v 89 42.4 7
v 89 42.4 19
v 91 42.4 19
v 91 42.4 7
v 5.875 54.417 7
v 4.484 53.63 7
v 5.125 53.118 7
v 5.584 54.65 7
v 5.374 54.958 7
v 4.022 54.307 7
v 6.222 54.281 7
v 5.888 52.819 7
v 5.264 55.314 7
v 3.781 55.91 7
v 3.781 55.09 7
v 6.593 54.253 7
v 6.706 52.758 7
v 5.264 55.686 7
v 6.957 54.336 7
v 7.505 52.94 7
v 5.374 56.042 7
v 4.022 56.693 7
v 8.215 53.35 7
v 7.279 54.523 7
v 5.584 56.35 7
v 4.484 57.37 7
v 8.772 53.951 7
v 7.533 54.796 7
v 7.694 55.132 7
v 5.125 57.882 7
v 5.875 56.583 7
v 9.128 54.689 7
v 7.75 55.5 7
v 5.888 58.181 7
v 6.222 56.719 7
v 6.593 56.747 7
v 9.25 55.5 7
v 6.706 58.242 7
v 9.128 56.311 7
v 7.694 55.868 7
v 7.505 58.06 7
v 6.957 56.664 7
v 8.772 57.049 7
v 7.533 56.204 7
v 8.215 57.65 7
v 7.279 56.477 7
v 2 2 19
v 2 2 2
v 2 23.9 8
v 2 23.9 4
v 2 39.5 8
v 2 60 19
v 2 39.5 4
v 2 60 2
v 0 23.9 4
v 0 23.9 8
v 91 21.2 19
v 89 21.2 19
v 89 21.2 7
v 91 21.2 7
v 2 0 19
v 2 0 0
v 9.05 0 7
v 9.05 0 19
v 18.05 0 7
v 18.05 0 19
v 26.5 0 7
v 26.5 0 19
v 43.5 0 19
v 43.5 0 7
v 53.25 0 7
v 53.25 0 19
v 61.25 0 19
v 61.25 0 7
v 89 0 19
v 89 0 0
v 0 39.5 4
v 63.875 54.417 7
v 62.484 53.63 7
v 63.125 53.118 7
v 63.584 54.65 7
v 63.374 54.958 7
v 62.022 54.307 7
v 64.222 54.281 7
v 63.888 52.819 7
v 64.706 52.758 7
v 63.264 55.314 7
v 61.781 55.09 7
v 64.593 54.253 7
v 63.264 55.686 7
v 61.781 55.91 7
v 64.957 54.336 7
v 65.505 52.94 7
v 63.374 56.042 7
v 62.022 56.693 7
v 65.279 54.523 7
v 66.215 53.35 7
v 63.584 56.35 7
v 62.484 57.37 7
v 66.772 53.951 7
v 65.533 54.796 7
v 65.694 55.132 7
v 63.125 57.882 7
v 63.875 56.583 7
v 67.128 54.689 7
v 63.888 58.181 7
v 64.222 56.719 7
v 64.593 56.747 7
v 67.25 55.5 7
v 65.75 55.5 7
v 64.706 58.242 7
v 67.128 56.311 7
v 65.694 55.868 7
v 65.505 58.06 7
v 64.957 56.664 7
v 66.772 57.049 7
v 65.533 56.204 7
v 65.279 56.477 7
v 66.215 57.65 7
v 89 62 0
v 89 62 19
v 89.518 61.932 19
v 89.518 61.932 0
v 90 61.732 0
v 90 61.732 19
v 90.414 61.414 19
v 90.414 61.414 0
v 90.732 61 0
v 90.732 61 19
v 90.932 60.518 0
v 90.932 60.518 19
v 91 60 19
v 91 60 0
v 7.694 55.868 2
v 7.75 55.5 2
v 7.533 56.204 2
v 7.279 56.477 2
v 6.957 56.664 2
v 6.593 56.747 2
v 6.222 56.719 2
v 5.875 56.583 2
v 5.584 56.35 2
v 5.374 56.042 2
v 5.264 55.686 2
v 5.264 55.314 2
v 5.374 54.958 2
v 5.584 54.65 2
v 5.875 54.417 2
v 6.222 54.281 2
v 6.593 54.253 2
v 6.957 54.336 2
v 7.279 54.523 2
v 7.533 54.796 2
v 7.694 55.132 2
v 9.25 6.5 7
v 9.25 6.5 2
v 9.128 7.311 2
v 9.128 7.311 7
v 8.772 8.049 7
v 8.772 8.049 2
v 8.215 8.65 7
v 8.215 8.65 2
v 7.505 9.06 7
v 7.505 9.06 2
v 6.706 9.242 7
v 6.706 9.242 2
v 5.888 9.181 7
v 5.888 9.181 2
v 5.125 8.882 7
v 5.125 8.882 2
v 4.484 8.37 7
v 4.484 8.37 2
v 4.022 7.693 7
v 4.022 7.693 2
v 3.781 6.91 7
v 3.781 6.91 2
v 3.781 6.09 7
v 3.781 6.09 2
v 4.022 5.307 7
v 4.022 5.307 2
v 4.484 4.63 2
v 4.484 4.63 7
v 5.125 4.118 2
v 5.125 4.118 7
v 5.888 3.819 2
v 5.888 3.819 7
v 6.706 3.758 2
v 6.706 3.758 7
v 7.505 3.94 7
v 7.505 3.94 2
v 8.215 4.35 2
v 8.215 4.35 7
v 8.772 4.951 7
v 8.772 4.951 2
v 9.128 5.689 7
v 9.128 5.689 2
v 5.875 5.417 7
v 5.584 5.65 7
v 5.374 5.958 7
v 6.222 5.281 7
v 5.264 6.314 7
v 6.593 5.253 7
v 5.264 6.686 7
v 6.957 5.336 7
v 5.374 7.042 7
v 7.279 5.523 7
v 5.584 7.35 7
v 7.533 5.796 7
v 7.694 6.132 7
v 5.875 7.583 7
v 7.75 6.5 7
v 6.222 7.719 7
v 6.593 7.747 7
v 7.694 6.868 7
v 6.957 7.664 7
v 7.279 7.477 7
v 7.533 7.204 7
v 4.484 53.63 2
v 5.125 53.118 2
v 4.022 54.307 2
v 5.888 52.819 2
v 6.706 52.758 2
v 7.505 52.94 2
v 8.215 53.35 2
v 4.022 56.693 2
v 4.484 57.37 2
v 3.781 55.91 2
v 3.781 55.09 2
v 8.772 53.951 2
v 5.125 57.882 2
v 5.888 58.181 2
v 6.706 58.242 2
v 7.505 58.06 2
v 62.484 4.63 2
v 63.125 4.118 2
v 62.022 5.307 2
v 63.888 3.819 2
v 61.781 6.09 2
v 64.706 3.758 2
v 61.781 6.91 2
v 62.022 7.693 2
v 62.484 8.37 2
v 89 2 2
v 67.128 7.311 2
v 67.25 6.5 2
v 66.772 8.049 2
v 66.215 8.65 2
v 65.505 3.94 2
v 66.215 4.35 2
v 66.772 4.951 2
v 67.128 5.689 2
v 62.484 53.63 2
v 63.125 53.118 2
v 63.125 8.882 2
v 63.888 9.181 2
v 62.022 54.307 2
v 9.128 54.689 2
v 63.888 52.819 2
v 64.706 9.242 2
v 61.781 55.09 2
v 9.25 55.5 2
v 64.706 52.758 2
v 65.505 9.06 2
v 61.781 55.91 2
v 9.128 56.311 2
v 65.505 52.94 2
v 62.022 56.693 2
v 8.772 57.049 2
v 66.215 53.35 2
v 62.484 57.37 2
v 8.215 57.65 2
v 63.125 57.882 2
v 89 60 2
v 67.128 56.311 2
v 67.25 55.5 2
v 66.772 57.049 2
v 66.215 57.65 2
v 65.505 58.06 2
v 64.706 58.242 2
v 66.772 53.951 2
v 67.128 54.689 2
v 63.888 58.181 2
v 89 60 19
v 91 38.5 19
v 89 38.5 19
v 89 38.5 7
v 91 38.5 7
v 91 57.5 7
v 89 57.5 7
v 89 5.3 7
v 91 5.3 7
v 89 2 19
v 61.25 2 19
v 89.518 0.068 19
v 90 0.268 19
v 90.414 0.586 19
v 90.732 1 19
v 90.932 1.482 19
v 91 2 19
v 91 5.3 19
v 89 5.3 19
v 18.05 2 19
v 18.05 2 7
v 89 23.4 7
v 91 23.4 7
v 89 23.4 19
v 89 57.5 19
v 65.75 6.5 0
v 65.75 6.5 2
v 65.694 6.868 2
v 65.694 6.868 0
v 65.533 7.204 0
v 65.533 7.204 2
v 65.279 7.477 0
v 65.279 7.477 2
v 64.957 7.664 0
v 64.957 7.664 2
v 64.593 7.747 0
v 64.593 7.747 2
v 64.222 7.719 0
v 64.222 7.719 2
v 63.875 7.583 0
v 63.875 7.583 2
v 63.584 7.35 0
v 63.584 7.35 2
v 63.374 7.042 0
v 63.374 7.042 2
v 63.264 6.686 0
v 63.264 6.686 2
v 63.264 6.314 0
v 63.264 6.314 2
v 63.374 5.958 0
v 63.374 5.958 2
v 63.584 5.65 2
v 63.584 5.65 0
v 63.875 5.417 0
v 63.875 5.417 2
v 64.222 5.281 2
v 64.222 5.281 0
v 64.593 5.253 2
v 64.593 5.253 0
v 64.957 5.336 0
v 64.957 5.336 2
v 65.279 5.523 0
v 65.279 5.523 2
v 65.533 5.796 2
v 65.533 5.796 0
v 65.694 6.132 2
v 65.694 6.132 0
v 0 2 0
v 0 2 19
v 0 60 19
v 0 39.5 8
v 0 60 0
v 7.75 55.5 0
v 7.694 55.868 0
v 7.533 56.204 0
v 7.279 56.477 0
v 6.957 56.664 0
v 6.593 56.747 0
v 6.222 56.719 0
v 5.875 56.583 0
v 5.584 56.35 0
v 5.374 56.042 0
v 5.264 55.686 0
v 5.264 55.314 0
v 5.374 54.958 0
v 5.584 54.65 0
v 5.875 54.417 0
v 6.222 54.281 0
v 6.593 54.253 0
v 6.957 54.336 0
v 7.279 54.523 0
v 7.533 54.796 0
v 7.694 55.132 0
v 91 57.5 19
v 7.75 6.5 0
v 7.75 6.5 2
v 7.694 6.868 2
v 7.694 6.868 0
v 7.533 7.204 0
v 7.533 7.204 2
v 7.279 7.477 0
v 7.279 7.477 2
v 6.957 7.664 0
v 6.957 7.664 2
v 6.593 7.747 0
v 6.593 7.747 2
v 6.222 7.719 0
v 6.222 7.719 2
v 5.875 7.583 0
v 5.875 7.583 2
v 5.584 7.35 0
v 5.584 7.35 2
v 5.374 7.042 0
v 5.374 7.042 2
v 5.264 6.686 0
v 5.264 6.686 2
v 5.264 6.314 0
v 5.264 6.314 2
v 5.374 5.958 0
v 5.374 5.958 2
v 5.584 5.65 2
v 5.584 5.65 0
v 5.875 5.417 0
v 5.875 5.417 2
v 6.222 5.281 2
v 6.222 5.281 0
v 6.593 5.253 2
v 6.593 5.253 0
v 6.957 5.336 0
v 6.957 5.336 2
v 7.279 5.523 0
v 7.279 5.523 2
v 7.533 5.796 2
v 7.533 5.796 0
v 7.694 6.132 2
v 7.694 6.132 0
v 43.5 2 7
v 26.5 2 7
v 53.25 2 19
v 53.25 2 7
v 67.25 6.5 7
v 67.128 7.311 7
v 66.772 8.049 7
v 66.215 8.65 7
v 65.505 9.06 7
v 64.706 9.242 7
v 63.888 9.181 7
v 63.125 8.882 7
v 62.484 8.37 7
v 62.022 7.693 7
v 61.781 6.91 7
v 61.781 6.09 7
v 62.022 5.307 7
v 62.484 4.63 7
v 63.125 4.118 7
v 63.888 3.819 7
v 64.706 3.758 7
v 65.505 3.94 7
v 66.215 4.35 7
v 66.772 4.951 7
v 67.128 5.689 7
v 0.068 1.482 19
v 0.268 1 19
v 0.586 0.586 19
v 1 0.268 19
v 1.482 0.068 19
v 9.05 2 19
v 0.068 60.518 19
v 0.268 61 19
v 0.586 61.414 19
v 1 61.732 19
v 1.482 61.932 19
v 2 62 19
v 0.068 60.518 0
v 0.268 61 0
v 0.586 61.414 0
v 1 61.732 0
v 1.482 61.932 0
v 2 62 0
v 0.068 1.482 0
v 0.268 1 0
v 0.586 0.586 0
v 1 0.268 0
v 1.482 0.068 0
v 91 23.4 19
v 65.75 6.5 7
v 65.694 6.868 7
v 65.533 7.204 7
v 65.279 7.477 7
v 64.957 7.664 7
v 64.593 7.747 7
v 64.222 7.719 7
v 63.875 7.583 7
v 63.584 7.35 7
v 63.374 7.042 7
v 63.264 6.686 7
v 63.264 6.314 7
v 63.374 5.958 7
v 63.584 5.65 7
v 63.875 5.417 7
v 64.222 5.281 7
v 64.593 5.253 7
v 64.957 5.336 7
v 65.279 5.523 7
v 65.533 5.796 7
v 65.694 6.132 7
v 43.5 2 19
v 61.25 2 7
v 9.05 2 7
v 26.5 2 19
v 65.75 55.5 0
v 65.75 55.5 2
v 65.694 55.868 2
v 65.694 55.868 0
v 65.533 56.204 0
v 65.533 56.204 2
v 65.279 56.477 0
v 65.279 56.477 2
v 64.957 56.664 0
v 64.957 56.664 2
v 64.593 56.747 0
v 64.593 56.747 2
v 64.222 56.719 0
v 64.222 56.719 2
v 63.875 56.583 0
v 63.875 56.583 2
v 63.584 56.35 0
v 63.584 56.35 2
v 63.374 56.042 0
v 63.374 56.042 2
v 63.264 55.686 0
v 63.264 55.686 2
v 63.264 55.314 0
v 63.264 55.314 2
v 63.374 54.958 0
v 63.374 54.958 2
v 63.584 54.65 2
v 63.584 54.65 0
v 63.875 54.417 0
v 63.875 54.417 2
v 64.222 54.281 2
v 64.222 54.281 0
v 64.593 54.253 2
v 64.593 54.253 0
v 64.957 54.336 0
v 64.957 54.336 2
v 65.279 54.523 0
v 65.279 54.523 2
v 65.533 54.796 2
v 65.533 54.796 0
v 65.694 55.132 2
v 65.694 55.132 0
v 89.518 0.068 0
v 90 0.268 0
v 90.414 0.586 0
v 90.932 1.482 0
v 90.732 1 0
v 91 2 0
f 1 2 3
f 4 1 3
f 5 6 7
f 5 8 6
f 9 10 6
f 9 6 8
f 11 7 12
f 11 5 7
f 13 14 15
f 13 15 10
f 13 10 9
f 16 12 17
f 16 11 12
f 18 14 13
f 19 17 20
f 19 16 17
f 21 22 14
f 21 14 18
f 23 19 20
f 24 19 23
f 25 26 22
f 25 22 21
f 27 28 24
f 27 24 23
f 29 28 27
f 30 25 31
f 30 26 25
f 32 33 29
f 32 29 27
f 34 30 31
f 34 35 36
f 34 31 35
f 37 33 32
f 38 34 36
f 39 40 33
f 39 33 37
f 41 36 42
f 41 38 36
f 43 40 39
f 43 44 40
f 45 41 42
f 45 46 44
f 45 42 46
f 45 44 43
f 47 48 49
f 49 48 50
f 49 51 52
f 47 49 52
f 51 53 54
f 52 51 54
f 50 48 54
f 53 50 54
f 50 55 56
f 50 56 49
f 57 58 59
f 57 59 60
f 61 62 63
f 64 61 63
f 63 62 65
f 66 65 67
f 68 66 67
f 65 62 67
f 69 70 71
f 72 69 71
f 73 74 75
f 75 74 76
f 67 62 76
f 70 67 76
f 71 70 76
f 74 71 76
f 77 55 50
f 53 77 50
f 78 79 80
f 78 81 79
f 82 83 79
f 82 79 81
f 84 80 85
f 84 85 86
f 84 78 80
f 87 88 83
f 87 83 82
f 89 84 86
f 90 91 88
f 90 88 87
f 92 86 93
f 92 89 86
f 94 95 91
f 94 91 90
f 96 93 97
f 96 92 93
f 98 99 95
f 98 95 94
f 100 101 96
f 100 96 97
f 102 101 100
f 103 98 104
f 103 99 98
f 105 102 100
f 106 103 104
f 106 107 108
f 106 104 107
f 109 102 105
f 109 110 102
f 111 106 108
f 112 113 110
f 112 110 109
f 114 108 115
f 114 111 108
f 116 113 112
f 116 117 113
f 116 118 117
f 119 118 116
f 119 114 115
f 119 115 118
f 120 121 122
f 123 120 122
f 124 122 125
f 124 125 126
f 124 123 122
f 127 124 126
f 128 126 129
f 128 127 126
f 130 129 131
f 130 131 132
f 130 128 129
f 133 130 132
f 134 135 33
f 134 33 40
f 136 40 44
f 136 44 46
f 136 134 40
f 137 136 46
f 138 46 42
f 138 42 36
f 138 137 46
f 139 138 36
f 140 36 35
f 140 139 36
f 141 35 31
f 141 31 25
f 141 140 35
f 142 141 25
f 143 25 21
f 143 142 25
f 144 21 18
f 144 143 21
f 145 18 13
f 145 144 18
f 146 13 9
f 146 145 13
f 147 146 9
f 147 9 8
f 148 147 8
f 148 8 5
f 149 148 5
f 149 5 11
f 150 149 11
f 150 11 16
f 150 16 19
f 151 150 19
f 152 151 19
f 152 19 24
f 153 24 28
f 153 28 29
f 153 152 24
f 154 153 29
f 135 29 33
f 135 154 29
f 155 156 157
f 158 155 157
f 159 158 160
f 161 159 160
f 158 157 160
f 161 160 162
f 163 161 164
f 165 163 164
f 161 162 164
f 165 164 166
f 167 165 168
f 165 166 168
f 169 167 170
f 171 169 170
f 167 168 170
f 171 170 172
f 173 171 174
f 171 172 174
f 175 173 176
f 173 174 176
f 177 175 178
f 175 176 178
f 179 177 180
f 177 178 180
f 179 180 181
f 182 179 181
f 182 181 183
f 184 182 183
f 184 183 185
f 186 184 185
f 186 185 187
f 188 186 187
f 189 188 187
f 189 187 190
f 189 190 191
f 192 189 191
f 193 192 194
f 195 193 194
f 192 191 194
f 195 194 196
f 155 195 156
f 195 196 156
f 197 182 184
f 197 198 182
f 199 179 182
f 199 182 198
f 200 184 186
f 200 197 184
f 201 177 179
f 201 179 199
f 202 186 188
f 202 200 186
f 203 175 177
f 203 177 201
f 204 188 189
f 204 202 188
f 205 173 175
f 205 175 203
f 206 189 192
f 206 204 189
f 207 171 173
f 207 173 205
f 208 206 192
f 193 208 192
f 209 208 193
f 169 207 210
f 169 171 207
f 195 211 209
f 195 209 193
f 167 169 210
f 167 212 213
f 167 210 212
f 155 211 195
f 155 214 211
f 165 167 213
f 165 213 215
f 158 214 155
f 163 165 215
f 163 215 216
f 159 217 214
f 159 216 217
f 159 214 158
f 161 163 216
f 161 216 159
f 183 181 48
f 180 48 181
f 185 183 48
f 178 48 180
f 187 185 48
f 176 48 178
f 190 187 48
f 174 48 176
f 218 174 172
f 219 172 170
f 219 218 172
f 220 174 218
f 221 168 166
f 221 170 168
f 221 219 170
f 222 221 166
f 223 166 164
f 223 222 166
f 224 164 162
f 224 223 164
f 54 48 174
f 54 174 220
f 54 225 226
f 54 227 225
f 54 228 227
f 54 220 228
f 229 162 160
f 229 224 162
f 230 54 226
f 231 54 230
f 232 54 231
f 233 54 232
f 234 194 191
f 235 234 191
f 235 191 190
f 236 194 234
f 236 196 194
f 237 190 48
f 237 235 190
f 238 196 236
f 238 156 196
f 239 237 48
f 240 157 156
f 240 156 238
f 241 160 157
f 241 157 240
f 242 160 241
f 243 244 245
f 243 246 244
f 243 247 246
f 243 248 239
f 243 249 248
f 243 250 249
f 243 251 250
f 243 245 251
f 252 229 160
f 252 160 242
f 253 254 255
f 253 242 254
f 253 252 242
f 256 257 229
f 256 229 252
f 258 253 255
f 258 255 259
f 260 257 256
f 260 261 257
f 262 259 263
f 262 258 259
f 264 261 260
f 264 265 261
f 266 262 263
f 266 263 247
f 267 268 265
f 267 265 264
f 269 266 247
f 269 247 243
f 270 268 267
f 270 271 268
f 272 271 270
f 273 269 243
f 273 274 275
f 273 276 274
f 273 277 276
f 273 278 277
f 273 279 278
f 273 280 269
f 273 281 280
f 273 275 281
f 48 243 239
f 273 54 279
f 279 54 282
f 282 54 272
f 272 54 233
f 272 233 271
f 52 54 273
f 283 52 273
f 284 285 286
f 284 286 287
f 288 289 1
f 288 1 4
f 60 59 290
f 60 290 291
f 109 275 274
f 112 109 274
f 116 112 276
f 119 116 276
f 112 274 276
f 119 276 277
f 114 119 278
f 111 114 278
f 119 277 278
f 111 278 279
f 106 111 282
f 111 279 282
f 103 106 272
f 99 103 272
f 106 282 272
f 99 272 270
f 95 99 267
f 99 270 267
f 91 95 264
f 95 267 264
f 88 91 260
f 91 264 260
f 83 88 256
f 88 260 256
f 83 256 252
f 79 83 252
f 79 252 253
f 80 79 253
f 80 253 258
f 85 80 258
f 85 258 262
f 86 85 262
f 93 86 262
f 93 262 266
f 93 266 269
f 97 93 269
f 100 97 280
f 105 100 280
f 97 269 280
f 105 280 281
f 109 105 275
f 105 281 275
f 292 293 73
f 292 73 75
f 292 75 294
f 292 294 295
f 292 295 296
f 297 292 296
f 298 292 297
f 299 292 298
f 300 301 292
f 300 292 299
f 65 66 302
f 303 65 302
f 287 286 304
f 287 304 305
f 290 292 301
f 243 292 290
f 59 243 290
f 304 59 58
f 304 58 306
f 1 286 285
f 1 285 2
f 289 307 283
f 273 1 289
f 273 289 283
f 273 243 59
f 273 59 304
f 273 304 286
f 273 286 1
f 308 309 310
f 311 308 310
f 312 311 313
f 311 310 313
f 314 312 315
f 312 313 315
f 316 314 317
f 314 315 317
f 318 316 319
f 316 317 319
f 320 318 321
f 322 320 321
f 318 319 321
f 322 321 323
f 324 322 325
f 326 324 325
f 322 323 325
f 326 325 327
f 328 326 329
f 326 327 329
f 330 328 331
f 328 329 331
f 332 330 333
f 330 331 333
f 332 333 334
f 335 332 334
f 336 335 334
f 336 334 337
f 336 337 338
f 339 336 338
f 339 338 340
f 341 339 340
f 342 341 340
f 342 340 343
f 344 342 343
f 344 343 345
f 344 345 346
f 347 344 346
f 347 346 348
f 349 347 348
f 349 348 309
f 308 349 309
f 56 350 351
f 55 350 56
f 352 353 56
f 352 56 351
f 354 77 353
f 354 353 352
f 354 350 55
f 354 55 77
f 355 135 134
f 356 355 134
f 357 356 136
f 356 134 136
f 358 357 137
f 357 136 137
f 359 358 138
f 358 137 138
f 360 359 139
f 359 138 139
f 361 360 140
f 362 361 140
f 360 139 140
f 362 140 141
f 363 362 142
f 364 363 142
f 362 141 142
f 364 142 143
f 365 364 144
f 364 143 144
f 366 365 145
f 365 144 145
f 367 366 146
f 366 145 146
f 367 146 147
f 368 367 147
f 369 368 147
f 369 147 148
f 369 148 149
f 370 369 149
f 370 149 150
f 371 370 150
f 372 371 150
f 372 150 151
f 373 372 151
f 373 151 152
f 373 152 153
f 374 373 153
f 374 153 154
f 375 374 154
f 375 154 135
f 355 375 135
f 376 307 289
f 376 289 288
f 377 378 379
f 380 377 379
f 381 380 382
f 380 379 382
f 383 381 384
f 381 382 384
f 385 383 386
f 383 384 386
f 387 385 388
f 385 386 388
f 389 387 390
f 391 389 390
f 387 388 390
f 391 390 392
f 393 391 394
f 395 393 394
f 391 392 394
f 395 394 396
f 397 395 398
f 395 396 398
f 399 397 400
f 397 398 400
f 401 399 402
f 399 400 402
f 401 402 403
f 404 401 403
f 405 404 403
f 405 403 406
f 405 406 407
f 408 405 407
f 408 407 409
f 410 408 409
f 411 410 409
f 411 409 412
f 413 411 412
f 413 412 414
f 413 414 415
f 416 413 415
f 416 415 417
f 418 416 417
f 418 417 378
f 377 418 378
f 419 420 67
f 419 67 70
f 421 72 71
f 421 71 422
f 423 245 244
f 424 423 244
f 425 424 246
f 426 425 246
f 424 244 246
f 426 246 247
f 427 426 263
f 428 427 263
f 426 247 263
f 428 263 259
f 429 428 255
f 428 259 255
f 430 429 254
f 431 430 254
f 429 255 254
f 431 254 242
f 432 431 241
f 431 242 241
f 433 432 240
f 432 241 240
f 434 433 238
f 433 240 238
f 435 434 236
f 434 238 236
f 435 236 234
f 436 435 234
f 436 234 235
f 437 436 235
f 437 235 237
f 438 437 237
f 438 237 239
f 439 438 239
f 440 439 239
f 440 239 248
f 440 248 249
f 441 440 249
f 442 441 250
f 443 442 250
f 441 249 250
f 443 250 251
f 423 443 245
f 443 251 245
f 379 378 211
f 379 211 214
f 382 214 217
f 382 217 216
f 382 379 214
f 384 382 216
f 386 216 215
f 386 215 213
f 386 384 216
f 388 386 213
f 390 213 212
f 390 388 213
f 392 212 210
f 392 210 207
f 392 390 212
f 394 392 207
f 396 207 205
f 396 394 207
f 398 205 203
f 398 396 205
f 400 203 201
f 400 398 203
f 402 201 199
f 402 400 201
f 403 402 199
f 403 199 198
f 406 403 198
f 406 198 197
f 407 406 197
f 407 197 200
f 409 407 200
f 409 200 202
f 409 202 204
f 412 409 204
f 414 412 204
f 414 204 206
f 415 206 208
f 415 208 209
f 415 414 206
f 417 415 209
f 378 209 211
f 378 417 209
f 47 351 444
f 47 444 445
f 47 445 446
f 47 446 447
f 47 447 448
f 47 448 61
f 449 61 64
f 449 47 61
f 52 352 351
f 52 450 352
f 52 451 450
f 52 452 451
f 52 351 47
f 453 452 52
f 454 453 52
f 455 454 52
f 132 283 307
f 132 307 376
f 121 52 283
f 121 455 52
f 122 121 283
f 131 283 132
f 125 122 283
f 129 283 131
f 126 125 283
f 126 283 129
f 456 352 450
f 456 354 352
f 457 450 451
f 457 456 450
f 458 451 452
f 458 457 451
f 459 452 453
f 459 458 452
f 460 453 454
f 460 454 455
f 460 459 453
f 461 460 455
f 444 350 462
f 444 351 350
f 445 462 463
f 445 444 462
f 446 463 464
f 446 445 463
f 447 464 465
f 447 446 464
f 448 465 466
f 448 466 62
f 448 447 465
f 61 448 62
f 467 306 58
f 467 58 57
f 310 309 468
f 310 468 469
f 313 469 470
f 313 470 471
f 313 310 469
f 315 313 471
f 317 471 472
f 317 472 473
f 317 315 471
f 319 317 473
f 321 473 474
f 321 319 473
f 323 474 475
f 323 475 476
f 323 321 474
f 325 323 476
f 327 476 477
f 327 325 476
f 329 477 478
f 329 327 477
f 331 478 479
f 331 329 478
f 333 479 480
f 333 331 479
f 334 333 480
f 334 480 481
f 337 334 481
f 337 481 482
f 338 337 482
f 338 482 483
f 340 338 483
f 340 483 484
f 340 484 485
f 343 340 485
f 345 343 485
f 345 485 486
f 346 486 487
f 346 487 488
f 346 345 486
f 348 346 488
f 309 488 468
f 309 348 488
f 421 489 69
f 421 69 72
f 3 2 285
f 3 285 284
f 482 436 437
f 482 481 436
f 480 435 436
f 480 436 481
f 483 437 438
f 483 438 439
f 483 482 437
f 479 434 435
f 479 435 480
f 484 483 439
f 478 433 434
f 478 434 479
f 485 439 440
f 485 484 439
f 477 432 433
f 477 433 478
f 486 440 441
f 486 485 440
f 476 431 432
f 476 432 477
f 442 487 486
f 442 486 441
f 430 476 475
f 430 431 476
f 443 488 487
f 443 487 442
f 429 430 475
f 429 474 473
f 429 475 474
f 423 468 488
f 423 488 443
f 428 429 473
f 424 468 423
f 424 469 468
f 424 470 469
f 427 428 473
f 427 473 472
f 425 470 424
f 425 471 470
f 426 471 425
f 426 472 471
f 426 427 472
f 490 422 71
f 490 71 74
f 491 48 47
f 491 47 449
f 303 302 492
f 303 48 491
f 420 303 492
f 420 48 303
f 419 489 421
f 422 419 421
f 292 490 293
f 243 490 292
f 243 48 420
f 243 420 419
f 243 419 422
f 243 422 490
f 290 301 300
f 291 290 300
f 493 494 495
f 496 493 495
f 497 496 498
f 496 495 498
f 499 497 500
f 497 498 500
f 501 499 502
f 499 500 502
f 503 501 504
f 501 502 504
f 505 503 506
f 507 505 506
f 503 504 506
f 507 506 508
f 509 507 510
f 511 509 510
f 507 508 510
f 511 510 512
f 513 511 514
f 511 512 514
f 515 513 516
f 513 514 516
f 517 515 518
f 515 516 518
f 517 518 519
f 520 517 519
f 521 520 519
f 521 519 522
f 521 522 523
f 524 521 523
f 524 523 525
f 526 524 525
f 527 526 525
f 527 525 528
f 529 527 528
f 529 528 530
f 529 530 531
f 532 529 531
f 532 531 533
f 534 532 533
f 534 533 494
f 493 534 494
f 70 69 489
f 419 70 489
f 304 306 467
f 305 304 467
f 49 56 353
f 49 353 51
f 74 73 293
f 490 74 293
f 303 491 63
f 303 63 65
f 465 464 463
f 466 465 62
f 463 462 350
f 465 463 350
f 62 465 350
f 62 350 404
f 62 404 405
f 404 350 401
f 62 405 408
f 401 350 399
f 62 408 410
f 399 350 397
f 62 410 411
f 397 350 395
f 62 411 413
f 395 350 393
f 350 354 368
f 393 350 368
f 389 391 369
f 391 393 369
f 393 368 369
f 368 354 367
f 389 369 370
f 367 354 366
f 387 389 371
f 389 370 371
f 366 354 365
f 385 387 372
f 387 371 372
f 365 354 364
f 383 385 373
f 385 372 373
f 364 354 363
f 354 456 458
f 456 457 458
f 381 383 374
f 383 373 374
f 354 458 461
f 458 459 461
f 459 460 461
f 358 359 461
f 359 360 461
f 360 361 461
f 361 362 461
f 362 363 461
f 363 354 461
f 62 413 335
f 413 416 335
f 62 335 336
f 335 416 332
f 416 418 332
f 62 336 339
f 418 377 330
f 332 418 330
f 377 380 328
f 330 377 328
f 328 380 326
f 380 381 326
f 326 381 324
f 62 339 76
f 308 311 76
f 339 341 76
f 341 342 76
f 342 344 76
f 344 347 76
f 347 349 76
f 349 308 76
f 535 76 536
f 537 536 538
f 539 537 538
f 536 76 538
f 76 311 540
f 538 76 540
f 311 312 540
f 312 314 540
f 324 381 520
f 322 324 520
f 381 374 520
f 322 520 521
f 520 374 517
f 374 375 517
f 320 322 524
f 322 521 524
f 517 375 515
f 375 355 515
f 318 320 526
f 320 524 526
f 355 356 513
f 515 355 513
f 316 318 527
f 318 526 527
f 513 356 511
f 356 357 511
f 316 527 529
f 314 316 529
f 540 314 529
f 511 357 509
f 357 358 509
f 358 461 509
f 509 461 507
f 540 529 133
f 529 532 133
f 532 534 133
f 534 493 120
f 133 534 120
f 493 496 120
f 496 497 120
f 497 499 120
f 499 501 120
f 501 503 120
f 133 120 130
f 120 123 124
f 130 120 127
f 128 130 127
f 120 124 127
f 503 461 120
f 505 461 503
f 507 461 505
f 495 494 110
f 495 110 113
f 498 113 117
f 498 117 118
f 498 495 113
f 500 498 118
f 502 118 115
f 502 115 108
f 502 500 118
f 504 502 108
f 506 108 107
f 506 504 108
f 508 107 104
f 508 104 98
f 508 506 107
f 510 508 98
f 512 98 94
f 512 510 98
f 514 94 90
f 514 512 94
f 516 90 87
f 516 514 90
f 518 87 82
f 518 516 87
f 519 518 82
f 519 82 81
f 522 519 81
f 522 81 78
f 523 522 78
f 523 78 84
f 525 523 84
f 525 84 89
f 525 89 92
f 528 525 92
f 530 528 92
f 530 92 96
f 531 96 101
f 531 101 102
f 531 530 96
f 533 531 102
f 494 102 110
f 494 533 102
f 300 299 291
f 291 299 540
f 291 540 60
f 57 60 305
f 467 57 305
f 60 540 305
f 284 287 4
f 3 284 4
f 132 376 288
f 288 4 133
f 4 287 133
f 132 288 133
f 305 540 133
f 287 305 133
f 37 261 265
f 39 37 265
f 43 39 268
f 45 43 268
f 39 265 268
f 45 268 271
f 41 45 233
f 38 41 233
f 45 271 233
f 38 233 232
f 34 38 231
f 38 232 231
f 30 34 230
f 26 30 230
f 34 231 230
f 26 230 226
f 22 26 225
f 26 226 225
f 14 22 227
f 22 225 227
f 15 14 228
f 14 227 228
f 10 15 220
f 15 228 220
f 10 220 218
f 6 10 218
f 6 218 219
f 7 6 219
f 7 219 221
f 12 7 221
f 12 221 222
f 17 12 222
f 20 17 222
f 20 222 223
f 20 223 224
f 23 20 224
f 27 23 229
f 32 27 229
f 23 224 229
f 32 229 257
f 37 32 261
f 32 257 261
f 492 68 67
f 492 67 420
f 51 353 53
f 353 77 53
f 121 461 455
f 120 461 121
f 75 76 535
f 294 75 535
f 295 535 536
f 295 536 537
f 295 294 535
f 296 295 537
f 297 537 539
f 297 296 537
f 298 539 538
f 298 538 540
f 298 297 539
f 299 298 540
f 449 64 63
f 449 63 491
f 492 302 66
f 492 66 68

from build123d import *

# Parameters (mm, degrees)
F0_W           = 91
F0_H           = 62
F0_W_2         = 87
F0_H_2         = 58
F1_DEPTH       = 2
F2_DEPTH       = 19
F3_R           = 2.75
F3_R_2         = 1.25
F4_DEPTH       = 5
F5_DEPTH       = 2.001
F6_W           = 3
F6_H           = 15.1
F6_H_2         = 15.9
F6_W_2         = 9
F6_H_3         = 2
F6_W_3         = 17
F6_W_4         = 8
F7_DEPTH       = 12
F8_R           = 2
F9_W           = 2
F9_H           = 15.6
F10_DEPTH      = 3
F10_DEPTH_BACK = 1


# Not quite as in the source:
# - a feature names something its author has since deleted; it is built from what else it names


with BuildPart() as f1:
    # F0 (on Top) → F1 (new body)
    with BuildSketch(Plane.XY):
        with Locations((45.5, 31)):
            Rectangle(F0_W, F0_H)
        with Locations((45.5, 31)):
            Rectangle(F0_W_2, F0_H_2, mode=Mode.SUBTRACT)
        with Locations((45.5, 31)):
            Rectangle(F0_W_2, F0_H_2)
    extrude(amount=F1_DEPTH)

    # F0 (on Top) → F2 (join)
    with BuildSketch(Plane.XY):
        with Locations((45.5, 31)):
            Rectangle(F0_W, F0_H)
        with Locations((45.5, 31)):
            Rectangle(F0_W_2, F0_H_2, mode=Mode.SUBTRACT)
    extrude(amount=F2_DEPTH)

    # F3 (on face) → F4 (join)
    with BuildSketch(Plane.XY.offset(2)):
        with Locations((6.5, 55.5)):
            Circle(F3_R)
        with Locations((6.5, 55.5)):
            Circle(F3_R_2, mode=Mode.SUBTRACT)
        with Locations((64.5, 55.5)):
            Circle(F3_R)
        with Locations((64.5, 55.5)):
            Circle(F3_R_2, mode=Mode.SUBTRACT)
        with Locations((64.5, 6.5)):
            Circle(F3_R)
        with Locations((64.5, 6.5)):
            Circle(F3_R_2, mode=Mode.SUBTRACT)
        with Locations((6.5, 6.5)):
            Circle(F3_R)
        with Locations((6.5, 6.5)):
            Circle(F3_R_2, mode=Mode.SUBTRACT)
    extrude(amount=F4_DEPTH)

    # F5 (cut, through all): faces of the model
    f5_faces = [f1.faces().sort_by_distance(p)[0] for p in [
        (6.5, 55.5, 2),
        (64.5, 55.5, 2),
        (64.5, 6.5, 2),
        (6.5, 6.5, 2),
    ]]
    extrude(f5_faces, amount=-F5_DEPTH, mode=Mode.SUBTRACT)

    # F6 (on face) → F7 (cut, through all)
    with BuildSketch(Plane.XY.offset(19)):
        with Locations((89.5, 49.95)):
            Rectangle(F6_W, F6_H)
        with Locations((89.5, 30.95)):
            Rectangle(F6_W, F6_H)
        with Locations((89.5, 13.25)):
            Rectangle(F6_W, F6_H_2)
        with Locations((13.55, 1)):
            Rectangle(F6_W_2, F6_H_3)
        with Locations((35, 1)):
            Rectangle(F6_W_3, F6_H_3)
        with Locations((57.25, 1)):
            Rectangle(F6_W_4, F6_H_3)
    extrude(amount=-F7_DEPTH, mode=Mode.SUBTRACT)

    # F8
    f8_edges = [f1.edges().sort_by_distance(p)[0] for p in [
        (91, 0, 9.5),
        (91, 62, 9.5),
        (0, 0, 9.5),
        (0, 62, 9.5),
    ]]
    fillet(f8_edges, radius=F8_R)

    # F9 (on face) → F10 (cut, two sides)
    with BuildSketch(Plane.XY.offset(7)) as f10_sk:
        with Locations((1, 31.7)):
            Rectangle(F9_W, F9_H)
    extrude(amount=-F10_DEPTH, mode=Mode.SUBTRACT)
    extrude(f10_sk.sketch, amount=F10_DEPTH_BACK, mode=Mode.SUBTRACT)


solid = f1.part
